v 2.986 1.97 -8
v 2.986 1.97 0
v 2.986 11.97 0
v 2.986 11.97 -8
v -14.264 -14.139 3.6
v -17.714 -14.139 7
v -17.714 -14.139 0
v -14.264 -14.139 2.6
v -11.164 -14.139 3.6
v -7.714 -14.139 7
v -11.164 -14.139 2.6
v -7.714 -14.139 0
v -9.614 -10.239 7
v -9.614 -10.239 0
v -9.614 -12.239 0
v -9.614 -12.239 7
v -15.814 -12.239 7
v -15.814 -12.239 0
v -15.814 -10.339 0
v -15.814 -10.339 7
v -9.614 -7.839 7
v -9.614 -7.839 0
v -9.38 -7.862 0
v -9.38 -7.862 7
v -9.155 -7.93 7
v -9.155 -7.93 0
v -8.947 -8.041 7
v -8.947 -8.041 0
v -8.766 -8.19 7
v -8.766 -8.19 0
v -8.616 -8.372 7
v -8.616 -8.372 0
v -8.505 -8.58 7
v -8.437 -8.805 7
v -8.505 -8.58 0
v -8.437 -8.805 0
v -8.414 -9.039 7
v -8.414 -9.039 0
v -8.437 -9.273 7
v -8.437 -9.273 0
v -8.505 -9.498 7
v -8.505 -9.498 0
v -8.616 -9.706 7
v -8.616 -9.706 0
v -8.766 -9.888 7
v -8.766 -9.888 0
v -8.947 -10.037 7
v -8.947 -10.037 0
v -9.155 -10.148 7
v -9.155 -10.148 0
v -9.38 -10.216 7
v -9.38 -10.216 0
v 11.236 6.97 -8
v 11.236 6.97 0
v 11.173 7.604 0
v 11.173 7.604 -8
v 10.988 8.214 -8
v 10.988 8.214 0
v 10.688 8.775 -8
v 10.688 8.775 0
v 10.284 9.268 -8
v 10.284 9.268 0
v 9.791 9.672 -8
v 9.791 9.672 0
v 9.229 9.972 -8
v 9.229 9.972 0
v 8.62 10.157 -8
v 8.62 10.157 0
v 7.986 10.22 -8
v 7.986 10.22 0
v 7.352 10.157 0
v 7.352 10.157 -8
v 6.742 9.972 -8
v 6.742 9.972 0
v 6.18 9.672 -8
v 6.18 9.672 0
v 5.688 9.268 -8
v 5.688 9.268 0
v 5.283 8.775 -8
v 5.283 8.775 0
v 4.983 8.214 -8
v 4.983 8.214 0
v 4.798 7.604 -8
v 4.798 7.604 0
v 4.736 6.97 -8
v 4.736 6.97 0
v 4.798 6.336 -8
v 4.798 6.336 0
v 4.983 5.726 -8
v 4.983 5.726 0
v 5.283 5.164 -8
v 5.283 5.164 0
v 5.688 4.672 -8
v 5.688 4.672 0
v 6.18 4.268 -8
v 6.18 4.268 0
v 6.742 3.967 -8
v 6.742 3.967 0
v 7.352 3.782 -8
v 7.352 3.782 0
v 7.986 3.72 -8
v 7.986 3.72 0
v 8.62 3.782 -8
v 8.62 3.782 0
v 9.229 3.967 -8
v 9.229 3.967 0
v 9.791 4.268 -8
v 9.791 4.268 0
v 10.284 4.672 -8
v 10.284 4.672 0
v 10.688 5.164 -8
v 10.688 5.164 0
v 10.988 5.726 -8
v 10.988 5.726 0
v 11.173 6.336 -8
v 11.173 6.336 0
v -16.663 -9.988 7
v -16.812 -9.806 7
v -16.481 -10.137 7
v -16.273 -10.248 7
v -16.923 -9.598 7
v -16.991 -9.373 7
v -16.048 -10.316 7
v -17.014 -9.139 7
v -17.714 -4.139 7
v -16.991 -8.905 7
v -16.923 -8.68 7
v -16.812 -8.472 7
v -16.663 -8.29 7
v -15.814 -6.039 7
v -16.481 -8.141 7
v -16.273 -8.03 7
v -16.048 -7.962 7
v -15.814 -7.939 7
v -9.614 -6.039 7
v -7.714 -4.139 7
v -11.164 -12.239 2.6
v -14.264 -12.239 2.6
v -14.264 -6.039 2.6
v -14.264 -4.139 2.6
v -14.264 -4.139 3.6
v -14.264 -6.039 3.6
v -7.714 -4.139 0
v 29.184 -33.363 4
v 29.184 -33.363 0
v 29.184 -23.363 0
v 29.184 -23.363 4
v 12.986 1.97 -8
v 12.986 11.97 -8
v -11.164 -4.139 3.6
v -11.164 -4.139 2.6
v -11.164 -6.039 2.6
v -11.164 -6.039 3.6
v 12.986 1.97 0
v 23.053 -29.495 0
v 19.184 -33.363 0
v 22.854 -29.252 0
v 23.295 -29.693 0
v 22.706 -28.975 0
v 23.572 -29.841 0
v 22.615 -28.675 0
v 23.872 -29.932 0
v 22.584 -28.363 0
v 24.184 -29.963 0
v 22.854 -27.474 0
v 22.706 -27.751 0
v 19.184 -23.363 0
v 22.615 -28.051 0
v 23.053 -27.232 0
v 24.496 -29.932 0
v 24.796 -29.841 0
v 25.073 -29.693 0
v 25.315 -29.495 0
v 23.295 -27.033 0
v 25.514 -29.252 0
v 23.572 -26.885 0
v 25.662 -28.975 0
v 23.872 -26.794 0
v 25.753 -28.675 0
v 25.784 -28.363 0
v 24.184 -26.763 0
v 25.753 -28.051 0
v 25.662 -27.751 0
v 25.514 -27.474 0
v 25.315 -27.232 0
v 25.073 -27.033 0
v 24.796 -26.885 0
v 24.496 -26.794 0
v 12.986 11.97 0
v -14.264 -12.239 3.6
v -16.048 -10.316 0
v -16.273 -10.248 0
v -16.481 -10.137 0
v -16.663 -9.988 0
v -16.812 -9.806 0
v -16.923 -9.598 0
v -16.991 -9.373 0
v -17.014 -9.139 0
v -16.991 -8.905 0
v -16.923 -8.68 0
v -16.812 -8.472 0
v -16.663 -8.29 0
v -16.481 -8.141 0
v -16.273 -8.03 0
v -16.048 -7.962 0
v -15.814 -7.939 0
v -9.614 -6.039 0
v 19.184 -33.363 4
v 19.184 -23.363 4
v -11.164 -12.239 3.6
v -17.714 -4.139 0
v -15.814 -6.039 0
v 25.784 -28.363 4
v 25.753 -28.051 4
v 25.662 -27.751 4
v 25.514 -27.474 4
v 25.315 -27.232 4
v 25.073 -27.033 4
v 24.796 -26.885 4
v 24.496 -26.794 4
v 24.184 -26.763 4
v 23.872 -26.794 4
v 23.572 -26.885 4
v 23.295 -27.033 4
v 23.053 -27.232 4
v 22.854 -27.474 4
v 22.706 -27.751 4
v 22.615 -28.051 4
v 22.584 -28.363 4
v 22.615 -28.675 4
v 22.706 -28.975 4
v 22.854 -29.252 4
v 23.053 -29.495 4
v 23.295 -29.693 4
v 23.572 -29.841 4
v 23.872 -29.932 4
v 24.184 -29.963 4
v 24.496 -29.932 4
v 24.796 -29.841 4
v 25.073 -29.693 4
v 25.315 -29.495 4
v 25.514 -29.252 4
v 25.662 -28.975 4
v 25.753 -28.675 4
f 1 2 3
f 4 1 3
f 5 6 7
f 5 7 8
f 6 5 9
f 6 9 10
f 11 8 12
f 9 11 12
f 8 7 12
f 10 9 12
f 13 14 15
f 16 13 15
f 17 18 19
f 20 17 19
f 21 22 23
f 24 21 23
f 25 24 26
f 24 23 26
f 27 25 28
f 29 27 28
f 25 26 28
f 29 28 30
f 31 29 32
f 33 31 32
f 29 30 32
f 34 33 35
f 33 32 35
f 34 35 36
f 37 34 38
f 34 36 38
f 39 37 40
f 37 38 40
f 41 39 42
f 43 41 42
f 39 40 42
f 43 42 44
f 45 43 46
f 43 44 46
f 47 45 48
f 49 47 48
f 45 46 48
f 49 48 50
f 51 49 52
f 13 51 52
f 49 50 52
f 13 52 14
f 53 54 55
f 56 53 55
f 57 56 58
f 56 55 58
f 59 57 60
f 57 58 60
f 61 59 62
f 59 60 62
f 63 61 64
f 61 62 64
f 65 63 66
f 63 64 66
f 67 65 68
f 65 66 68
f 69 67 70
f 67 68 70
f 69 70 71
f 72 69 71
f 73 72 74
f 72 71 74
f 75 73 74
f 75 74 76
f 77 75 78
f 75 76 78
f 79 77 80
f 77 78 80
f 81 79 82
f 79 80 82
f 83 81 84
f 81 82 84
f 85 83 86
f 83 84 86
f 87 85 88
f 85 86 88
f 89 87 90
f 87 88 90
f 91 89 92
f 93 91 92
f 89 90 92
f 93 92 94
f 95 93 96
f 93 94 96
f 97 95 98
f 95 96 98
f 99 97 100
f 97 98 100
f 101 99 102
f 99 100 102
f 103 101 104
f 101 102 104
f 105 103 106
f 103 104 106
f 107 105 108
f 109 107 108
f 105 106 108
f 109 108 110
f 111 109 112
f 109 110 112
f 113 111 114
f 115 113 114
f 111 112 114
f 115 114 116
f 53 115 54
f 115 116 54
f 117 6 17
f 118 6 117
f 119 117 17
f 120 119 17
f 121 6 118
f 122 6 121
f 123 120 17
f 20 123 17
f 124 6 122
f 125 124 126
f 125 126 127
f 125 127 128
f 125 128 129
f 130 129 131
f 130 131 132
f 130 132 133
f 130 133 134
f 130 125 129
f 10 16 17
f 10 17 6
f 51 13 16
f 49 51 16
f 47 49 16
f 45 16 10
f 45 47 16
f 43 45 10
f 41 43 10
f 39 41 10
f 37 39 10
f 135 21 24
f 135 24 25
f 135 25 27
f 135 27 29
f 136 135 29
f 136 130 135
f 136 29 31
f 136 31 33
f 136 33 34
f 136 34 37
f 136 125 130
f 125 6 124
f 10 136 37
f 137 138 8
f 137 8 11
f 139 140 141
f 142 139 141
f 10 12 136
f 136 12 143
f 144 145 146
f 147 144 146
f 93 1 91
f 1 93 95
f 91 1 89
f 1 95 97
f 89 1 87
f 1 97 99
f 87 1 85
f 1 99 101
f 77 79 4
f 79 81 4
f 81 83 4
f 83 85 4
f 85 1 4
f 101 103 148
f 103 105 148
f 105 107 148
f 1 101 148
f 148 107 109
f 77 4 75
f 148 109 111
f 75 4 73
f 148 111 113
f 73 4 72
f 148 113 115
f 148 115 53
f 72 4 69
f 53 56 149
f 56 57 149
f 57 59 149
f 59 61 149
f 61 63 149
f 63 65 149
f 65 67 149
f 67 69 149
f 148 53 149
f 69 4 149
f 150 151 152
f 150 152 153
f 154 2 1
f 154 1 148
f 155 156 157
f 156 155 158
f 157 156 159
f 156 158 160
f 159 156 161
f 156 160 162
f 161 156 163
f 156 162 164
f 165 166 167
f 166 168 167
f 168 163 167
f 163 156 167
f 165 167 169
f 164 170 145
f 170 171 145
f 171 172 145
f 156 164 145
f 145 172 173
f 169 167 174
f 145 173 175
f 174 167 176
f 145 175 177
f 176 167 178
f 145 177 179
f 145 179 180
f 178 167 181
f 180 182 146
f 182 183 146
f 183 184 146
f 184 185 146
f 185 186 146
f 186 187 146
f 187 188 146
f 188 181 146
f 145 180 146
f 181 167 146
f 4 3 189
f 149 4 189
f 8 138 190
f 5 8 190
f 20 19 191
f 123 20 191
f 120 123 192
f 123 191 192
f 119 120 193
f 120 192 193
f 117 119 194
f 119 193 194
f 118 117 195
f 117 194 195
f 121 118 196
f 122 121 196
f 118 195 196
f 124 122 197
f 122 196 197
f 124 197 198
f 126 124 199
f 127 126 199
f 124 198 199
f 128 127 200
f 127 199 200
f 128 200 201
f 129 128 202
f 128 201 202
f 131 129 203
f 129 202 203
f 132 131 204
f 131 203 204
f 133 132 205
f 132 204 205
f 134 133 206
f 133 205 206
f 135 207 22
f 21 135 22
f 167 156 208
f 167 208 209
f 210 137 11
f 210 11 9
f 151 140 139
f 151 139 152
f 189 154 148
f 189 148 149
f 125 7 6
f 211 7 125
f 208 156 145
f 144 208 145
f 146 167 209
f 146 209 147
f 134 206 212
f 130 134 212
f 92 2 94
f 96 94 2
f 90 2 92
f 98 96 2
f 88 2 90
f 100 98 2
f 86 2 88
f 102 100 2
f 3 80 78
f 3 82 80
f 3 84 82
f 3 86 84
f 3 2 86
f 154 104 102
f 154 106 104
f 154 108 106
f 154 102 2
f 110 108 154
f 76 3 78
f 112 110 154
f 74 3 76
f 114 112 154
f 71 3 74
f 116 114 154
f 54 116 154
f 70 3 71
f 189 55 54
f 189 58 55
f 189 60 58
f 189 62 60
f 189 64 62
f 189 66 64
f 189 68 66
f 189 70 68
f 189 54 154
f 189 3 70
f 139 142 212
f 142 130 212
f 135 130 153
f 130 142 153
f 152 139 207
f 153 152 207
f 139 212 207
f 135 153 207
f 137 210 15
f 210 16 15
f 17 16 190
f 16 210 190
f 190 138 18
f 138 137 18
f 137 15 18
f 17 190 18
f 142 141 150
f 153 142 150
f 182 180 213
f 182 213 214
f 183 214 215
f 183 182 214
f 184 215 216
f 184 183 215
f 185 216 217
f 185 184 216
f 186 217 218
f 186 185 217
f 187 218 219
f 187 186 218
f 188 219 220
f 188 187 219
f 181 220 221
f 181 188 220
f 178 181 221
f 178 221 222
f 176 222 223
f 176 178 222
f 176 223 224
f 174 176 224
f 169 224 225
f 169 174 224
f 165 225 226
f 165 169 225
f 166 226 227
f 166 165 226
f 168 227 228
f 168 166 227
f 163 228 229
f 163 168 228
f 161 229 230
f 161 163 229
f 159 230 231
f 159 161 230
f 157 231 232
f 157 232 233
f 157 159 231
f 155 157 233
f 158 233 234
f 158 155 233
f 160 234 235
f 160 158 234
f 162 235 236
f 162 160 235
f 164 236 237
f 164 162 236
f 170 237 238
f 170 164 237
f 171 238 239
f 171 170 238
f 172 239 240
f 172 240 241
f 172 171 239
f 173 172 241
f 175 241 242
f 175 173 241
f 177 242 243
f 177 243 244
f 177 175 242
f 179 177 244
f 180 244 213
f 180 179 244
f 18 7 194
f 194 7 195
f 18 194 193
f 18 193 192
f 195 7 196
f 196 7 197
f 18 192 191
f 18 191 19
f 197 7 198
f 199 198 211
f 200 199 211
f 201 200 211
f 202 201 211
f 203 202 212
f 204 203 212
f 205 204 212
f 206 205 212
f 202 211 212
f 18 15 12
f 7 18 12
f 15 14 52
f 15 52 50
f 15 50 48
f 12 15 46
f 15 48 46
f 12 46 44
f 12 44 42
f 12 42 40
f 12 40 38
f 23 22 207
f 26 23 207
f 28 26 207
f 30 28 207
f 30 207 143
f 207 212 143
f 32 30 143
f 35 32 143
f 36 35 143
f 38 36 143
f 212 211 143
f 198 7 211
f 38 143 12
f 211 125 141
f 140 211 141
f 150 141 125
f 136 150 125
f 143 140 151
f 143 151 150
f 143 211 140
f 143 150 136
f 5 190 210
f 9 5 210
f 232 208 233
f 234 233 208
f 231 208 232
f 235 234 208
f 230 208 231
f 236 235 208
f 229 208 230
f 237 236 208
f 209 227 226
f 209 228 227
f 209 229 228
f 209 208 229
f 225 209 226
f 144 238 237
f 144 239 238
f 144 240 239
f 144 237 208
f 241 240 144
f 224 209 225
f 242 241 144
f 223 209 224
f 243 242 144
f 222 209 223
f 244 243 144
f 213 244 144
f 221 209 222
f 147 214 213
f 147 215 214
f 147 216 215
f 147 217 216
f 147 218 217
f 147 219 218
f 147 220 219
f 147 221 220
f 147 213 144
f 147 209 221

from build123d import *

# Parameters (mm, degrees)
F1_W     = 10
F1_H     = 10
F1_R     = 3.25
F3_DEPTH = 8
F0_W     = 10
F0_H     = 10
F4_DEPTH = 7
F5_W     = 3.1
F5_H     = 1
F6_DEPTH = 14.140019
F2_W     = 10
F2_H     = 10
F2_R     = 1.6
F7_DEPTH = 4


with BuildPart() as f3:
    # F1 (on Top) → F3 (new body)
    with BuildSketch(Plane.XY):
        with Locations((7.985733, 6.969889)):
            Rectangle(F1_W, F1_H)
        with Locations((7.985733, 6.969889)):
            Circle(F1_R, mode=Mode.SUBTRACT)
    extrude(amount=-F3_DEPTH)


with BuildPart() as f4:
    # F0 (on Top) → F4 (new body)
    with BuildSketch(Plane.XY):
        with Locations((-12.714077, -9.139019)):
            Rectangle(F0_W, F0_H)
        with BuildLine():
            Line((-15.814077, -7.939019), (-15.814077, -6.039019))
            Line((-15.814077, -6.039019), (-9.614077, -6.039019))
            Line((-9.614077, -6.039019), (-9.614077, -7.839019))
            ThreePointArc((-9.614077, -7.839019), (-8.414077, -9.039019), (-9.614077, -10.239019))
            Line((-9.614077, -10.239019), (-9.614077, -12.239019))
            Line((-9.614077, -12.239019), (-15.814077, -12.239019))
            Line((-15.814077, -12.239019), (-15.814077, -10.339019))
            ThreePointArc((-15.814077, -10.339019), (-17.014077, -9.139019), (-15.814077, -7.939019))
        make_face(mode=Mode.SUBTRACT)
    extrude(amount=F4_DEPTH)

    # F5 (on Front) → F6 (cut, through all)
    with BuildSketch(Plane.XZ):
        with Locations((-12.714077, 3.1)):
            Rectangle(F5_W, F5_H)
    extrude(amount=F6_DEPTH, mode=Mode.SUBTRACT)


with BuildPart() as f7:
    # F2 (on Top) → F7 (new body)
    with BuildSketch(Plane.XY):
        with Locations((24.183963, -28.36313)):
            Rectangle(F2_W, F2_H)
        with Locations((24.183963, -28.36313)):
            Circle(F2_R, mode=Mode.SUBTRACT)
    extrude(amount=F7_DEPTH)


solid = Compound([f3.part, f4.part, f7.part])
